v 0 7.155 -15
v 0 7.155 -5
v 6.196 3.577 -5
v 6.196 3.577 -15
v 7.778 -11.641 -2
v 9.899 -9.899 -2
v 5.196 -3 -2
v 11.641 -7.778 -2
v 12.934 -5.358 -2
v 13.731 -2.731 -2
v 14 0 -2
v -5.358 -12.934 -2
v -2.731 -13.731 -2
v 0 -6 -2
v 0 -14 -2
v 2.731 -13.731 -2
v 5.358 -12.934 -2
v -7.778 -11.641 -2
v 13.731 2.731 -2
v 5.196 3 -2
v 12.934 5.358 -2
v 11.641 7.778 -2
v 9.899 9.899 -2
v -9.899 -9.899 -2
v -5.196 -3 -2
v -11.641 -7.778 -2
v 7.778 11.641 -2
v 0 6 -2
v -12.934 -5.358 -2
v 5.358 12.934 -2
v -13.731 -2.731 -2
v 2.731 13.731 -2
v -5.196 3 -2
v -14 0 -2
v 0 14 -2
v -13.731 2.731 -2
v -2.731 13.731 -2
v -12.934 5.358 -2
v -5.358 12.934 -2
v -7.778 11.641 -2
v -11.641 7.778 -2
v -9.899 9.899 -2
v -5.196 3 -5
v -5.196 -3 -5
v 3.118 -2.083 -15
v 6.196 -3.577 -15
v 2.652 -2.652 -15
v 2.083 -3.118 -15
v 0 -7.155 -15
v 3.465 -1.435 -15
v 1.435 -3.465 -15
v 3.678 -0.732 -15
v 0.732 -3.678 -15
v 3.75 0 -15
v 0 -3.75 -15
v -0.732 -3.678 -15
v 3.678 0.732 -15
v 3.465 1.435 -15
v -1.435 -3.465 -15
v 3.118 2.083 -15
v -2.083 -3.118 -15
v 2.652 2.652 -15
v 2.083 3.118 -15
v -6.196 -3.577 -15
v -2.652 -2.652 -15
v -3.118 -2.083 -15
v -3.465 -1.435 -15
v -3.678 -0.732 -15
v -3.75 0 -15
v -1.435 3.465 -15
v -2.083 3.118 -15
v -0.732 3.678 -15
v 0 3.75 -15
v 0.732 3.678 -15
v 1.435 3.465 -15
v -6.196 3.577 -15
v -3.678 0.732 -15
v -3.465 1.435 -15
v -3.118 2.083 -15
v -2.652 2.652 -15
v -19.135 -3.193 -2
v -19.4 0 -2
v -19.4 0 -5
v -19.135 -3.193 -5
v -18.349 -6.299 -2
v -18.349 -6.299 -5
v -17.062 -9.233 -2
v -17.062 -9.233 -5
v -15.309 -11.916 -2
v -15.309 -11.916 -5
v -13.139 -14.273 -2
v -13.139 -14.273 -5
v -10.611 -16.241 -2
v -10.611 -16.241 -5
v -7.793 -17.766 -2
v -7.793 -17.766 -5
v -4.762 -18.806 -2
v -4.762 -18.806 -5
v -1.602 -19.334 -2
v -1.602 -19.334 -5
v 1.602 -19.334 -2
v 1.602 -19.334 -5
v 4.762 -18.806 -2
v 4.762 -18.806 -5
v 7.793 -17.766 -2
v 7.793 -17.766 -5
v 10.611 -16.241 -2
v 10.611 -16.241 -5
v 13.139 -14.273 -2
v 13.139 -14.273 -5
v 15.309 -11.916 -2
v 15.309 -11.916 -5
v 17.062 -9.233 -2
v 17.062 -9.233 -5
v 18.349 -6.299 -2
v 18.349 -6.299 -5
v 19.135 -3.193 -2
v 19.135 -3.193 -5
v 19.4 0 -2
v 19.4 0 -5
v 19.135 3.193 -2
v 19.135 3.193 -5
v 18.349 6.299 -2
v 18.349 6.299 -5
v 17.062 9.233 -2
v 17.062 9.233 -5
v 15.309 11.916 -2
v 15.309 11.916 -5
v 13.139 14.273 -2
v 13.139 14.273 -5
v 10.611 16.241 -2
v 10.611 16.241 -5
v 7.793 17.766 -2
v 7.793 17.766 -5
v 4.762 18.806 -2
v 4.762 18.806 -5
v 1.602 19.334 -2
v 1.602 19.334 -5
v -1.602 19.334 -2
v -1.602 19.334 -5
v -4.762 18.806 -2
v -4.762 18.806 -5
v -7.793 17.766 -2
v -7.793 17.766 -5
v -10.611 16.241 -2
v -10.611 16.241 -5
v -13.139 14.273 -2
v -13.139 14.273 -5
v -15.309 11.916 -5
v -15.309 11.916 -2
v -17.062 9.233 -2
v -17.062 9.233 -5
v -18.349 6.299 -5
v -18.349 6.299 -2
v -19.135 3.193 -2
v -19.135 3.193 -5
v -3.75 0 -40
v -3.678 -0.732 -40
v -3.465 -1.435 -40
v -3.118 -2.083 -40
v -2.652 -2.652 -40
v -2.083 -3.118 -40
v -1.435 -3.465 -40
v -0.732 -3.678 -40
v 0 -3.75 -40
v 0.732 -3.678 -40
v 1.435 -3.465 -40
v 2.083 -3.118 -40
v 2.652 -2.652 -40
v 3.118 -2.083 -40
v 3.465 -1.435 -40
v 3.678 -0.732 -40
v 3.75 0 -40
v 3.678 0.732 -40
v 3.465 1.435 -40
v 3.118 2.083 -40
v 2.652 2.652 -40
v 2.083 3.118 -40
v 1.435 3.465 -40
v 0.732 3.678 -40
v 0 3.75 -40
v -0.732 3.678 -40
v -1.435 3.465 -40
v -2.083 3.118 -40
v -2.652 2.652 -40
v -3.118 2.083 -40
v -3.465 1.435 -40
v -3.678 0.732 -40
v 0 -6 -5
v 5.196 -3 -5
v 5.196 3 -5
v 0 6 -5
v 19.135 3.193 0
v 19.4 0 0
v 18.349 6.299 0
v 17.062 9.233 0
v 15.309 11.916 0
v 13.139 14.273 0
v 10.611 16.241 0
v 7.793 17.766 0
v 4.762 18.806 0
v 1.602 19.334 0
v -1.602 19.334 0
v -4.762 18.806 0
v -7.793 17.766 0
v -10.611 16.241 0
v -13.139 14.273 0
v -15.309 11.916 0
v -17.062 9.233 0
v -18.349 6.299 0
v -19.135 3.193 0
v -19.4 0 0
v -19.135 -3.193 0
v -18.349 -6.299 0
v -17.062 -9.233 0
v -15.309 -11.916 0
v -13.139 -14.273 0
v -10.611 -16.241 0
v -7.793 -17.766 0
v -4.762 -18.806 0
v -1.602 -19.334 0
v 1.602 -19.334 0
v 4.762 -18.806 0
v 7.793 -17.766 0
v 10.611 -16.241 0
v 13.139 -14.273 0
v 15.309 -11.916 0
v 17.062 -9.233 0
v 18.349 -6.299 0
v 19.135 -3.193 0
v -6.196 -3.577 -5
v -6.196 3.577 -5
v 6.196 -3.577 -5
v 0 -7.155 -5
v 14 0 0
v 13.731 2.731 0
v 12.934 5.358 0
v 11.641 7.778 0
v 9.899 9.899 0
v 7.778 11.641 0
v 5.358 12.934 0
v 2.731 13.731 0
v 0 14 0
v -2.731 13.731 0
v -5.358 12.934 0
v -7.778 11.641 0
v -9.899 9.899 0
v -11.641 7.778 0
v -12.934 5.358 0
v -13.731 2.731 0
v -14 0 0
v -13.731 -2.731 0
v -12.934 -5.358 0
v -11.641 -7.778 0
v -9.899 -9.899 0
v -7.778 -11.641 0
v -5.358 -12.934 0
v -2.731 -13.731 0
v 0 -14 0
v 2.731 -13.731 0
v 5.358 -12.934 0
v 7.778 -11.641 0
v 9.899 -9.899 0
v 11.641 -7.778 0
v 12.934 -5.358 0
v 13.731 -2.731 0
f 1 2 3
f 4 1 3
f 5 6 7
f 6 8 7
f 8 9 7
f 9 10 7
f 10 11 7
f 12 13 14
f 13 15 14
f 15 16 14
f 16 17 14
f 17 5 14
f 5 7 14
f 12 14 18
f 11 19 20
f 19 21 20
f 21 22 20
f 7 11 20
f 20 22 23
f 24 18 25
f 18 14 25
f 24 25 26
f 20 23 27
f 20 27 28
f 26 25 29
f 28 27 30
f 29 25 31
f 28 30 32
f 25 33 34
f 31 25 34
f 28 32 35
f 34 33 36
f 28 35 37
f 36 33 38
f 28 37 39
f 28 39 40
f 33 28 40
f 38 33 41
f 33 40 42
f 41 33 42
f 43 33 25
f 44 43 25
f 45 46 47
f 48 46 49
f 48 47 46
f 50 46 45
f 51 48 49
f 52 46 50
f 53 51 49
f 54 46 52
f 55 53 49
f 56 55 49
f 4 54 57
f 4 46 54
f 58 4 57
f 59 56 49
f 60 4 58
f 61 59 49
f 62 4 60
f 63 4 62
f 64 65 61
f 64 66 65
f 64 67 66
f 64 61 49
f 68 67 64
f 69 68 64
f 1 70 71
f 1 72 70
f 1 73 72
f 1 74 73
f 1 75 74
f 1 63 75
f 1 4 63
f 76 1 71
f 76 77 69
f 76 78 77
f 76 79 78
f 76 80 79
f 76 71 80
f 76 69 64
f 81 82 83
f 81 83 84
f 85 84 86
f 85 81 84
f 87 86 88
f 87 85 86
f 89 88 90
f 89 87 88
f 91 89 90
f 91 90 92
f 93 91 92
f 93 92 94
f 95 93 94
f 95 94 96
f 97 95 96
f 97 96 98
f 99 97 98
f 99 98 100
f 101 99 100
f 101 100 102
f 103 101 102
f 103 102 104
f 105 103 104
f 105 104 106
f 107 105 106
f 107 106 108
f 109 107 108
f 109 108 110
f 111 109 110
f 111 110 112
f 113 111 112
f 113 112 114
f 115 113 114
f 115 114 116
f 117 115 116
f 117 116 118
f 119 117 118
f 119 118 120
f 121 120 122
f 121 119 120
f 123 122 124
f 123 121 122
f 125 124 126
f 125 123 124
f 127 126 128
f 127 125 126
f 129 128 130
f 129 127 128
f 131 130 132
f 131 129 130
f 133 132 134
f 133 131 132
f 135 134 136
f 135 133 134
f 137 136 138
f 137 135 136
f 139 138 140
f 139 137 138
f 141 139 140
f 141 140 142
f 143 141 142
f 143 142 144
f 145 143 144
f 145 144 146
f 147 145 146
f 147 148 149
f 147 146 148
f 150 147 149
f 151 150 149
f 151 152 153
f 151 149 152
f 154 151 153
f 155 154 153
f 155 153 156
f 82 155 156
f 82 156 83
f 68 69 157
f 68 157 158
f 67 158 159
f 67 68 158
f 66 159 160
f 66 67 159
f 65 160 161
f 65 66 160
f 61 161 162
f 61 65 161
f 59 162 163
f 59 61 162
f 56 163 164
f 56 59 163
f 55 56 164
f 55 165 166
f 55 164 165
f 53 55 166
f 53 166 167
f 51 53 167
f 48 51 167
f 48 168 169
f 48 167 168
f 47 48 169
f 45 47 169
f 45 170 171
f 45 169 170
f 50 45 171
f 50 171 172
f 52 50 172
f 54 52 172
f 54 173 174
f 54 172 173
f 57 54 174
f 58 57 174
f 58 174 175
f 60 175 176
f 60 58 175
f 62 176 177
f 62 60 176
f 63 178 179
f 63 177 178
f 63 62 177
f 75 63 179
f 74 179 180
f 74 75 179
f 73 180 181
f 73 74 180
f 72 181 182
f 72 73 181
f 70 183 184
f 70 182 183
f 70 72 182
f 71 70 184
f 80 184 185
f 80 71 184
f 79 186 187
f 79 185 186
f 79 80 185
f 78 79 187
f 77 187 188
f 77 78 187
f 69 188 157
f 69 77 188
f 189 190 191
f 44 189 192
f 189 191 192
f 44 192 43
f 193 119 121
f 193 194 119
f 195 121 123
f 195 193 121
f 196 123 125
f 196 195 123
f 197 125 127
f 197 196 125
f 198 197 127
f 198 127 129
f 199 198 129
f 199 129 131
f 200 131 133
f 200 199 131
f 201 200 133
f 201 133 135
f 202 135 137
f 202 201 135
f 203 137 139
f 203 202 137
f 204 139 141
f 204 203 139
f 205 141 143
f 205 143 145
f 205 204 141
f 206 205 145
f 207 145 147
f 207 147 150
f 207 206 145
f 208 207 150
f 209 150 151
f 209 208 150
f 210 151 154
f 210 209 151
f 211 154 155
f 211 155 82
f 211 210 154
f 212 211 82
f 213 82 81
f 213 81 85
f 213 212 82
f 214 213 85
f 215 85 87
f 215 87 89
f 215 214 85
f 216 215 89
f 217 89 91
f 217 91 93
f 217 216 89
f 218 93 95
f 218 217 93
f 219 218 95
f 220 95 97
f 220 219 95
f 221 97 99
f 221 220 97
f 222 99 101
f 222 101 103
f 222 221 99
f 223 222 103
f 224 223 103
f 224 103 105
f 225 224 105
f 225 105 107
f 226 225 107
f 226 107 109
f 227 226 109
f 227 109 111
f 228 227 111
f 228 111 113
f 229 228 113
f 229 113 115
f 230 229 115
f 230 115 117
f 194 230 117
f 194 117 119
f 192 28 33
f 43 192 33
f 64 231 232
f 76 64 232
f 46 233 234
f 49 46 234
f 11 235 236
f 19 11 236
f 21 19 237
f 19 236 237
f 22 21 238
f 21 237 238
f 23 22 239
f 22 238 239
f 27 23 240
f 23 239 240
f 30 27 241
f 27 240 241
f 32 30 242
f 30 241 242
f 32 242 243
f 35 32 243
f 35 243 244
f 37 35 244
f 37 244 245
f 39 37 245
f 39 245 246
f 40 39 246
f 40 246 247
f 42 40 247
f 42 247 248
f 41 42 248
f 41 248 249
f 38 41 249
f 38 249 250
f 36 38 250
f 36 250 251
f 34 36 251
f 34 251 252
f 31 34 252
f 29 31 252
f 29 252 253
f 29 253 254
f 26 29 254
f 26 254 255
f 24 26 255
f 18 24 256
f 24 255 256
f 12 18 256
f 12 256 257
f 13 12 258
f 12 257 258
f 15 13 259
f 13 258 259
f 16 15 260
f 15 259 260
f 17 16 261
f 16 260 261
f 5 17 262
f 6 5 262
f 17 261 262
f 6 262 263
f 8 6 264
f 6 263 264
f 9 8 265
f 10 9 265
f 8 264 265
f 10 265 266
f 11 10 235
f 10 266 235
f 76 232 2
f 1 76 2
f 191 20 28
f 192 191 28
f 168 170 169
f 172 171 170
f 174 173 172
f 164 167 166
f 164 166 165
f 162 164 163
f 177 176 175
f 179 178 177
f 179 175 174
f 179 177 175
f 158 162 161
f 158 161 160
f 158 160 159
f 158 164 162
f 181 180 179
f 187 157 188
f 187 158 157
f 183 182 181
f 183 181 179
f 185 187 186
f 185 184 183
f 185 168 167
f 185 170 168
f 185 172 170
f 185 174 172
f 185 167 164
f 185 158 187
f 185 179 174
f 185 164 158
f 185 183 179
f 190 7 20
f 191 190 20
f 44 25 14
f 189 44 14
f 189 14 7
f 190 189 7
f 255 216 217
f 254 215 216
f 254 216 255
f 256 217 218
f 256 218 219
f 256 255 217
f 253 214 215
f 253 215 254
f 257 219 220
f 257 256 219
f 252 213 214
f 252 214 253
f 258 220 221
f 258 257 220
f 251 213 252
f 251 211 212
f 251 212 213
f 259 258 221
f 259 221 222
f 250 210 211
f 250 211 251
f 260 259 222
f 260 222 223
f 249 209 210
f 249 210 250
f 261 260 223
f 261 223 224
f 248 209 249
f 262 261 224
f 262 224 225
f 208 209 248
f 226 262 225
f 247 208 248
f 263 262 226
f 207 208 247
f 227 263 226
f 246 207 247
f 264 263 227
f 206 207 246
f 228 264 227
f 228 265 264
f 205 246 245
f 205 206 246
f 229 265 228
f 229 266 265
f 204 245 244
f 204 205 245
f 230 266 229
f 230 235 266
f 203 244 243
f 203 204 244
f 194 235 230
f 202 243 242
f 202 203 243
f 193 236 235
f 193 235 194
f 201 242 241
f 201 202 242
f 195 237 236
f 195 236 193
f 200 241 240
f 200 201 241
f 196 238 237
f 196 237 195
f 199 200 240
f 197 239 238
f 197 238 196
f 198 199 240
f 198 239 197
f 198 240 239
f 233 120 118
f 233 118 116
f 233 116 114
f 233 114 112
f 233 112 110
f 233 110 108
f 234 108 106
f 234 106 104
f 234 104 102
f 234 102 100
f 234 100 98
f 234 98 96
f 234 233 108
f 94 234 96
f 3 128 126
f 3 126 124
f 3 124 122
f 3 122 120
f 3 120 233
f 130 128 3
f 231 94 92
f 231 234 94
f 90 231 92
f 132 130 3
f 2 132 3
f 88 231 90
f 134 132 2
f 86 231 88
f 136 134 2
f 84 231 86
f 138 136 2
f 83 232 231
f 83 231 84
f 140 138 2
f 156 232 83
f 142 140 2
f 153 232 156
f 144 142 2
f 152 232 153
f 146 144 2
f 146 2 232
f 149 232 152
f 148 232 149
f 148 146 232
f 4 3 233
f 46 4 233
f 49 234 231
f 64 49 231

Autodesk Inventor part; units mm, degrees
sketch "Sketch1" plane through (0, 0, 0) normal (0, 0, 1) x (1, 0, 0)
  circle A0 centre (0, 0) radius 19.4
  circle A1 centre (0, 0) radius 14
  dimension "d0" = 38.8
  dimension "d1" = 28
extrude "Extrusion1" add sketch "Sketch1" against normal blind 2
ref_plane "Work Plane1" through (-19.6075, -25, -15) normal (0, 0, 1) x (1, 0, 0)
ref_plane "Work Plane2" through (-137.3725, -100, -40) normal (0, 0, -1) x (0, 1, 0)
sketch "Sketch5" plane through (0, 0, -2) normal (0, 0, -1) x (-1, 0, 0)
  circle A0 centre (0, 0) radius 19.4 projected
  line L0 (-5.1962, -3) -> (-5.1962, 3)
  line L1 (-5.1962, 3) -> (0, 6)
  line L2 (0, 6) -> (5.1962, 3)
  line L3 (5.1962, 3) -> (5.1962, -3)
  line L4 (5.1962, -3) -> (0, -6)
  line L5 (0, -6) -> (-5.1962, -3)
  dimension "d14" = 6
extrude "Extrusion5" add sketch "Sketch5" along normal blind 3
sketch "Sketch6" plane through (0, 0, -5) normal (0, 0, -1) x (-1, 0, 0)
  circle A0 centre (0, 0) radius 19.4 projected
  line L0 (-5.1962, -3) -> (-5.1962, 3) projected
  line L1 (-5.1962, 3) -> (0, 6) projected
  line L2 (0, 6) -> (5.1962, 3) projected
  line L3 (5.1962, 3) -> (5.1962, -3) projected
  line L4 (5.1962, -3) -> (0, -6) projected
  line L5 (0, -6) -> (-5.1962, -3) projected
  line L6 (-6.1962, 3.5774) -> (-6.1962, -3.5774)
  line L7 (-6.1962, -3.5774) -> (0, -7.1547)
  line L8 (0, -7.1547) -> (6.1962, -3.5774)
  line L9 (6.1962, -3.5774) -> (6.1962, 3.5774)
  line L10 (6.1962, 3.5774) -> (0, 7.1547)
  line L11 (0, 7.1547) -> (-6.1962, 3.5774)
  dimension "d17" = 1
ref_plane "Work Plane3" through (-19.6075, -25, -15) normal (0, 0, 1) x (1, 0, 0)
extrude "Extrusion6" add sketch "Sketch6" along normal up to surface (10 mm away) contours L0 L1 L2 L3 L4 L5 | L11 L10 L9 L8 L7 L6
sketch "Sketch7" plane through (6.1962, -3.5774, -15) normal (0, 0, -1) x (-1, 0, 0)
  circle A0 centre (6.1962, 3.5774) radius 3.75
  dimension "d20" = 7.5
ref_plane "Work Plane4" through (-137.3725, -100, -40) normal (0, 0, -1) x (0, 1, 0)
extrude "Extrusion7" add sketch "Sketch7" along normal up to surface (25 mm away)
properties part number "Reverser"
